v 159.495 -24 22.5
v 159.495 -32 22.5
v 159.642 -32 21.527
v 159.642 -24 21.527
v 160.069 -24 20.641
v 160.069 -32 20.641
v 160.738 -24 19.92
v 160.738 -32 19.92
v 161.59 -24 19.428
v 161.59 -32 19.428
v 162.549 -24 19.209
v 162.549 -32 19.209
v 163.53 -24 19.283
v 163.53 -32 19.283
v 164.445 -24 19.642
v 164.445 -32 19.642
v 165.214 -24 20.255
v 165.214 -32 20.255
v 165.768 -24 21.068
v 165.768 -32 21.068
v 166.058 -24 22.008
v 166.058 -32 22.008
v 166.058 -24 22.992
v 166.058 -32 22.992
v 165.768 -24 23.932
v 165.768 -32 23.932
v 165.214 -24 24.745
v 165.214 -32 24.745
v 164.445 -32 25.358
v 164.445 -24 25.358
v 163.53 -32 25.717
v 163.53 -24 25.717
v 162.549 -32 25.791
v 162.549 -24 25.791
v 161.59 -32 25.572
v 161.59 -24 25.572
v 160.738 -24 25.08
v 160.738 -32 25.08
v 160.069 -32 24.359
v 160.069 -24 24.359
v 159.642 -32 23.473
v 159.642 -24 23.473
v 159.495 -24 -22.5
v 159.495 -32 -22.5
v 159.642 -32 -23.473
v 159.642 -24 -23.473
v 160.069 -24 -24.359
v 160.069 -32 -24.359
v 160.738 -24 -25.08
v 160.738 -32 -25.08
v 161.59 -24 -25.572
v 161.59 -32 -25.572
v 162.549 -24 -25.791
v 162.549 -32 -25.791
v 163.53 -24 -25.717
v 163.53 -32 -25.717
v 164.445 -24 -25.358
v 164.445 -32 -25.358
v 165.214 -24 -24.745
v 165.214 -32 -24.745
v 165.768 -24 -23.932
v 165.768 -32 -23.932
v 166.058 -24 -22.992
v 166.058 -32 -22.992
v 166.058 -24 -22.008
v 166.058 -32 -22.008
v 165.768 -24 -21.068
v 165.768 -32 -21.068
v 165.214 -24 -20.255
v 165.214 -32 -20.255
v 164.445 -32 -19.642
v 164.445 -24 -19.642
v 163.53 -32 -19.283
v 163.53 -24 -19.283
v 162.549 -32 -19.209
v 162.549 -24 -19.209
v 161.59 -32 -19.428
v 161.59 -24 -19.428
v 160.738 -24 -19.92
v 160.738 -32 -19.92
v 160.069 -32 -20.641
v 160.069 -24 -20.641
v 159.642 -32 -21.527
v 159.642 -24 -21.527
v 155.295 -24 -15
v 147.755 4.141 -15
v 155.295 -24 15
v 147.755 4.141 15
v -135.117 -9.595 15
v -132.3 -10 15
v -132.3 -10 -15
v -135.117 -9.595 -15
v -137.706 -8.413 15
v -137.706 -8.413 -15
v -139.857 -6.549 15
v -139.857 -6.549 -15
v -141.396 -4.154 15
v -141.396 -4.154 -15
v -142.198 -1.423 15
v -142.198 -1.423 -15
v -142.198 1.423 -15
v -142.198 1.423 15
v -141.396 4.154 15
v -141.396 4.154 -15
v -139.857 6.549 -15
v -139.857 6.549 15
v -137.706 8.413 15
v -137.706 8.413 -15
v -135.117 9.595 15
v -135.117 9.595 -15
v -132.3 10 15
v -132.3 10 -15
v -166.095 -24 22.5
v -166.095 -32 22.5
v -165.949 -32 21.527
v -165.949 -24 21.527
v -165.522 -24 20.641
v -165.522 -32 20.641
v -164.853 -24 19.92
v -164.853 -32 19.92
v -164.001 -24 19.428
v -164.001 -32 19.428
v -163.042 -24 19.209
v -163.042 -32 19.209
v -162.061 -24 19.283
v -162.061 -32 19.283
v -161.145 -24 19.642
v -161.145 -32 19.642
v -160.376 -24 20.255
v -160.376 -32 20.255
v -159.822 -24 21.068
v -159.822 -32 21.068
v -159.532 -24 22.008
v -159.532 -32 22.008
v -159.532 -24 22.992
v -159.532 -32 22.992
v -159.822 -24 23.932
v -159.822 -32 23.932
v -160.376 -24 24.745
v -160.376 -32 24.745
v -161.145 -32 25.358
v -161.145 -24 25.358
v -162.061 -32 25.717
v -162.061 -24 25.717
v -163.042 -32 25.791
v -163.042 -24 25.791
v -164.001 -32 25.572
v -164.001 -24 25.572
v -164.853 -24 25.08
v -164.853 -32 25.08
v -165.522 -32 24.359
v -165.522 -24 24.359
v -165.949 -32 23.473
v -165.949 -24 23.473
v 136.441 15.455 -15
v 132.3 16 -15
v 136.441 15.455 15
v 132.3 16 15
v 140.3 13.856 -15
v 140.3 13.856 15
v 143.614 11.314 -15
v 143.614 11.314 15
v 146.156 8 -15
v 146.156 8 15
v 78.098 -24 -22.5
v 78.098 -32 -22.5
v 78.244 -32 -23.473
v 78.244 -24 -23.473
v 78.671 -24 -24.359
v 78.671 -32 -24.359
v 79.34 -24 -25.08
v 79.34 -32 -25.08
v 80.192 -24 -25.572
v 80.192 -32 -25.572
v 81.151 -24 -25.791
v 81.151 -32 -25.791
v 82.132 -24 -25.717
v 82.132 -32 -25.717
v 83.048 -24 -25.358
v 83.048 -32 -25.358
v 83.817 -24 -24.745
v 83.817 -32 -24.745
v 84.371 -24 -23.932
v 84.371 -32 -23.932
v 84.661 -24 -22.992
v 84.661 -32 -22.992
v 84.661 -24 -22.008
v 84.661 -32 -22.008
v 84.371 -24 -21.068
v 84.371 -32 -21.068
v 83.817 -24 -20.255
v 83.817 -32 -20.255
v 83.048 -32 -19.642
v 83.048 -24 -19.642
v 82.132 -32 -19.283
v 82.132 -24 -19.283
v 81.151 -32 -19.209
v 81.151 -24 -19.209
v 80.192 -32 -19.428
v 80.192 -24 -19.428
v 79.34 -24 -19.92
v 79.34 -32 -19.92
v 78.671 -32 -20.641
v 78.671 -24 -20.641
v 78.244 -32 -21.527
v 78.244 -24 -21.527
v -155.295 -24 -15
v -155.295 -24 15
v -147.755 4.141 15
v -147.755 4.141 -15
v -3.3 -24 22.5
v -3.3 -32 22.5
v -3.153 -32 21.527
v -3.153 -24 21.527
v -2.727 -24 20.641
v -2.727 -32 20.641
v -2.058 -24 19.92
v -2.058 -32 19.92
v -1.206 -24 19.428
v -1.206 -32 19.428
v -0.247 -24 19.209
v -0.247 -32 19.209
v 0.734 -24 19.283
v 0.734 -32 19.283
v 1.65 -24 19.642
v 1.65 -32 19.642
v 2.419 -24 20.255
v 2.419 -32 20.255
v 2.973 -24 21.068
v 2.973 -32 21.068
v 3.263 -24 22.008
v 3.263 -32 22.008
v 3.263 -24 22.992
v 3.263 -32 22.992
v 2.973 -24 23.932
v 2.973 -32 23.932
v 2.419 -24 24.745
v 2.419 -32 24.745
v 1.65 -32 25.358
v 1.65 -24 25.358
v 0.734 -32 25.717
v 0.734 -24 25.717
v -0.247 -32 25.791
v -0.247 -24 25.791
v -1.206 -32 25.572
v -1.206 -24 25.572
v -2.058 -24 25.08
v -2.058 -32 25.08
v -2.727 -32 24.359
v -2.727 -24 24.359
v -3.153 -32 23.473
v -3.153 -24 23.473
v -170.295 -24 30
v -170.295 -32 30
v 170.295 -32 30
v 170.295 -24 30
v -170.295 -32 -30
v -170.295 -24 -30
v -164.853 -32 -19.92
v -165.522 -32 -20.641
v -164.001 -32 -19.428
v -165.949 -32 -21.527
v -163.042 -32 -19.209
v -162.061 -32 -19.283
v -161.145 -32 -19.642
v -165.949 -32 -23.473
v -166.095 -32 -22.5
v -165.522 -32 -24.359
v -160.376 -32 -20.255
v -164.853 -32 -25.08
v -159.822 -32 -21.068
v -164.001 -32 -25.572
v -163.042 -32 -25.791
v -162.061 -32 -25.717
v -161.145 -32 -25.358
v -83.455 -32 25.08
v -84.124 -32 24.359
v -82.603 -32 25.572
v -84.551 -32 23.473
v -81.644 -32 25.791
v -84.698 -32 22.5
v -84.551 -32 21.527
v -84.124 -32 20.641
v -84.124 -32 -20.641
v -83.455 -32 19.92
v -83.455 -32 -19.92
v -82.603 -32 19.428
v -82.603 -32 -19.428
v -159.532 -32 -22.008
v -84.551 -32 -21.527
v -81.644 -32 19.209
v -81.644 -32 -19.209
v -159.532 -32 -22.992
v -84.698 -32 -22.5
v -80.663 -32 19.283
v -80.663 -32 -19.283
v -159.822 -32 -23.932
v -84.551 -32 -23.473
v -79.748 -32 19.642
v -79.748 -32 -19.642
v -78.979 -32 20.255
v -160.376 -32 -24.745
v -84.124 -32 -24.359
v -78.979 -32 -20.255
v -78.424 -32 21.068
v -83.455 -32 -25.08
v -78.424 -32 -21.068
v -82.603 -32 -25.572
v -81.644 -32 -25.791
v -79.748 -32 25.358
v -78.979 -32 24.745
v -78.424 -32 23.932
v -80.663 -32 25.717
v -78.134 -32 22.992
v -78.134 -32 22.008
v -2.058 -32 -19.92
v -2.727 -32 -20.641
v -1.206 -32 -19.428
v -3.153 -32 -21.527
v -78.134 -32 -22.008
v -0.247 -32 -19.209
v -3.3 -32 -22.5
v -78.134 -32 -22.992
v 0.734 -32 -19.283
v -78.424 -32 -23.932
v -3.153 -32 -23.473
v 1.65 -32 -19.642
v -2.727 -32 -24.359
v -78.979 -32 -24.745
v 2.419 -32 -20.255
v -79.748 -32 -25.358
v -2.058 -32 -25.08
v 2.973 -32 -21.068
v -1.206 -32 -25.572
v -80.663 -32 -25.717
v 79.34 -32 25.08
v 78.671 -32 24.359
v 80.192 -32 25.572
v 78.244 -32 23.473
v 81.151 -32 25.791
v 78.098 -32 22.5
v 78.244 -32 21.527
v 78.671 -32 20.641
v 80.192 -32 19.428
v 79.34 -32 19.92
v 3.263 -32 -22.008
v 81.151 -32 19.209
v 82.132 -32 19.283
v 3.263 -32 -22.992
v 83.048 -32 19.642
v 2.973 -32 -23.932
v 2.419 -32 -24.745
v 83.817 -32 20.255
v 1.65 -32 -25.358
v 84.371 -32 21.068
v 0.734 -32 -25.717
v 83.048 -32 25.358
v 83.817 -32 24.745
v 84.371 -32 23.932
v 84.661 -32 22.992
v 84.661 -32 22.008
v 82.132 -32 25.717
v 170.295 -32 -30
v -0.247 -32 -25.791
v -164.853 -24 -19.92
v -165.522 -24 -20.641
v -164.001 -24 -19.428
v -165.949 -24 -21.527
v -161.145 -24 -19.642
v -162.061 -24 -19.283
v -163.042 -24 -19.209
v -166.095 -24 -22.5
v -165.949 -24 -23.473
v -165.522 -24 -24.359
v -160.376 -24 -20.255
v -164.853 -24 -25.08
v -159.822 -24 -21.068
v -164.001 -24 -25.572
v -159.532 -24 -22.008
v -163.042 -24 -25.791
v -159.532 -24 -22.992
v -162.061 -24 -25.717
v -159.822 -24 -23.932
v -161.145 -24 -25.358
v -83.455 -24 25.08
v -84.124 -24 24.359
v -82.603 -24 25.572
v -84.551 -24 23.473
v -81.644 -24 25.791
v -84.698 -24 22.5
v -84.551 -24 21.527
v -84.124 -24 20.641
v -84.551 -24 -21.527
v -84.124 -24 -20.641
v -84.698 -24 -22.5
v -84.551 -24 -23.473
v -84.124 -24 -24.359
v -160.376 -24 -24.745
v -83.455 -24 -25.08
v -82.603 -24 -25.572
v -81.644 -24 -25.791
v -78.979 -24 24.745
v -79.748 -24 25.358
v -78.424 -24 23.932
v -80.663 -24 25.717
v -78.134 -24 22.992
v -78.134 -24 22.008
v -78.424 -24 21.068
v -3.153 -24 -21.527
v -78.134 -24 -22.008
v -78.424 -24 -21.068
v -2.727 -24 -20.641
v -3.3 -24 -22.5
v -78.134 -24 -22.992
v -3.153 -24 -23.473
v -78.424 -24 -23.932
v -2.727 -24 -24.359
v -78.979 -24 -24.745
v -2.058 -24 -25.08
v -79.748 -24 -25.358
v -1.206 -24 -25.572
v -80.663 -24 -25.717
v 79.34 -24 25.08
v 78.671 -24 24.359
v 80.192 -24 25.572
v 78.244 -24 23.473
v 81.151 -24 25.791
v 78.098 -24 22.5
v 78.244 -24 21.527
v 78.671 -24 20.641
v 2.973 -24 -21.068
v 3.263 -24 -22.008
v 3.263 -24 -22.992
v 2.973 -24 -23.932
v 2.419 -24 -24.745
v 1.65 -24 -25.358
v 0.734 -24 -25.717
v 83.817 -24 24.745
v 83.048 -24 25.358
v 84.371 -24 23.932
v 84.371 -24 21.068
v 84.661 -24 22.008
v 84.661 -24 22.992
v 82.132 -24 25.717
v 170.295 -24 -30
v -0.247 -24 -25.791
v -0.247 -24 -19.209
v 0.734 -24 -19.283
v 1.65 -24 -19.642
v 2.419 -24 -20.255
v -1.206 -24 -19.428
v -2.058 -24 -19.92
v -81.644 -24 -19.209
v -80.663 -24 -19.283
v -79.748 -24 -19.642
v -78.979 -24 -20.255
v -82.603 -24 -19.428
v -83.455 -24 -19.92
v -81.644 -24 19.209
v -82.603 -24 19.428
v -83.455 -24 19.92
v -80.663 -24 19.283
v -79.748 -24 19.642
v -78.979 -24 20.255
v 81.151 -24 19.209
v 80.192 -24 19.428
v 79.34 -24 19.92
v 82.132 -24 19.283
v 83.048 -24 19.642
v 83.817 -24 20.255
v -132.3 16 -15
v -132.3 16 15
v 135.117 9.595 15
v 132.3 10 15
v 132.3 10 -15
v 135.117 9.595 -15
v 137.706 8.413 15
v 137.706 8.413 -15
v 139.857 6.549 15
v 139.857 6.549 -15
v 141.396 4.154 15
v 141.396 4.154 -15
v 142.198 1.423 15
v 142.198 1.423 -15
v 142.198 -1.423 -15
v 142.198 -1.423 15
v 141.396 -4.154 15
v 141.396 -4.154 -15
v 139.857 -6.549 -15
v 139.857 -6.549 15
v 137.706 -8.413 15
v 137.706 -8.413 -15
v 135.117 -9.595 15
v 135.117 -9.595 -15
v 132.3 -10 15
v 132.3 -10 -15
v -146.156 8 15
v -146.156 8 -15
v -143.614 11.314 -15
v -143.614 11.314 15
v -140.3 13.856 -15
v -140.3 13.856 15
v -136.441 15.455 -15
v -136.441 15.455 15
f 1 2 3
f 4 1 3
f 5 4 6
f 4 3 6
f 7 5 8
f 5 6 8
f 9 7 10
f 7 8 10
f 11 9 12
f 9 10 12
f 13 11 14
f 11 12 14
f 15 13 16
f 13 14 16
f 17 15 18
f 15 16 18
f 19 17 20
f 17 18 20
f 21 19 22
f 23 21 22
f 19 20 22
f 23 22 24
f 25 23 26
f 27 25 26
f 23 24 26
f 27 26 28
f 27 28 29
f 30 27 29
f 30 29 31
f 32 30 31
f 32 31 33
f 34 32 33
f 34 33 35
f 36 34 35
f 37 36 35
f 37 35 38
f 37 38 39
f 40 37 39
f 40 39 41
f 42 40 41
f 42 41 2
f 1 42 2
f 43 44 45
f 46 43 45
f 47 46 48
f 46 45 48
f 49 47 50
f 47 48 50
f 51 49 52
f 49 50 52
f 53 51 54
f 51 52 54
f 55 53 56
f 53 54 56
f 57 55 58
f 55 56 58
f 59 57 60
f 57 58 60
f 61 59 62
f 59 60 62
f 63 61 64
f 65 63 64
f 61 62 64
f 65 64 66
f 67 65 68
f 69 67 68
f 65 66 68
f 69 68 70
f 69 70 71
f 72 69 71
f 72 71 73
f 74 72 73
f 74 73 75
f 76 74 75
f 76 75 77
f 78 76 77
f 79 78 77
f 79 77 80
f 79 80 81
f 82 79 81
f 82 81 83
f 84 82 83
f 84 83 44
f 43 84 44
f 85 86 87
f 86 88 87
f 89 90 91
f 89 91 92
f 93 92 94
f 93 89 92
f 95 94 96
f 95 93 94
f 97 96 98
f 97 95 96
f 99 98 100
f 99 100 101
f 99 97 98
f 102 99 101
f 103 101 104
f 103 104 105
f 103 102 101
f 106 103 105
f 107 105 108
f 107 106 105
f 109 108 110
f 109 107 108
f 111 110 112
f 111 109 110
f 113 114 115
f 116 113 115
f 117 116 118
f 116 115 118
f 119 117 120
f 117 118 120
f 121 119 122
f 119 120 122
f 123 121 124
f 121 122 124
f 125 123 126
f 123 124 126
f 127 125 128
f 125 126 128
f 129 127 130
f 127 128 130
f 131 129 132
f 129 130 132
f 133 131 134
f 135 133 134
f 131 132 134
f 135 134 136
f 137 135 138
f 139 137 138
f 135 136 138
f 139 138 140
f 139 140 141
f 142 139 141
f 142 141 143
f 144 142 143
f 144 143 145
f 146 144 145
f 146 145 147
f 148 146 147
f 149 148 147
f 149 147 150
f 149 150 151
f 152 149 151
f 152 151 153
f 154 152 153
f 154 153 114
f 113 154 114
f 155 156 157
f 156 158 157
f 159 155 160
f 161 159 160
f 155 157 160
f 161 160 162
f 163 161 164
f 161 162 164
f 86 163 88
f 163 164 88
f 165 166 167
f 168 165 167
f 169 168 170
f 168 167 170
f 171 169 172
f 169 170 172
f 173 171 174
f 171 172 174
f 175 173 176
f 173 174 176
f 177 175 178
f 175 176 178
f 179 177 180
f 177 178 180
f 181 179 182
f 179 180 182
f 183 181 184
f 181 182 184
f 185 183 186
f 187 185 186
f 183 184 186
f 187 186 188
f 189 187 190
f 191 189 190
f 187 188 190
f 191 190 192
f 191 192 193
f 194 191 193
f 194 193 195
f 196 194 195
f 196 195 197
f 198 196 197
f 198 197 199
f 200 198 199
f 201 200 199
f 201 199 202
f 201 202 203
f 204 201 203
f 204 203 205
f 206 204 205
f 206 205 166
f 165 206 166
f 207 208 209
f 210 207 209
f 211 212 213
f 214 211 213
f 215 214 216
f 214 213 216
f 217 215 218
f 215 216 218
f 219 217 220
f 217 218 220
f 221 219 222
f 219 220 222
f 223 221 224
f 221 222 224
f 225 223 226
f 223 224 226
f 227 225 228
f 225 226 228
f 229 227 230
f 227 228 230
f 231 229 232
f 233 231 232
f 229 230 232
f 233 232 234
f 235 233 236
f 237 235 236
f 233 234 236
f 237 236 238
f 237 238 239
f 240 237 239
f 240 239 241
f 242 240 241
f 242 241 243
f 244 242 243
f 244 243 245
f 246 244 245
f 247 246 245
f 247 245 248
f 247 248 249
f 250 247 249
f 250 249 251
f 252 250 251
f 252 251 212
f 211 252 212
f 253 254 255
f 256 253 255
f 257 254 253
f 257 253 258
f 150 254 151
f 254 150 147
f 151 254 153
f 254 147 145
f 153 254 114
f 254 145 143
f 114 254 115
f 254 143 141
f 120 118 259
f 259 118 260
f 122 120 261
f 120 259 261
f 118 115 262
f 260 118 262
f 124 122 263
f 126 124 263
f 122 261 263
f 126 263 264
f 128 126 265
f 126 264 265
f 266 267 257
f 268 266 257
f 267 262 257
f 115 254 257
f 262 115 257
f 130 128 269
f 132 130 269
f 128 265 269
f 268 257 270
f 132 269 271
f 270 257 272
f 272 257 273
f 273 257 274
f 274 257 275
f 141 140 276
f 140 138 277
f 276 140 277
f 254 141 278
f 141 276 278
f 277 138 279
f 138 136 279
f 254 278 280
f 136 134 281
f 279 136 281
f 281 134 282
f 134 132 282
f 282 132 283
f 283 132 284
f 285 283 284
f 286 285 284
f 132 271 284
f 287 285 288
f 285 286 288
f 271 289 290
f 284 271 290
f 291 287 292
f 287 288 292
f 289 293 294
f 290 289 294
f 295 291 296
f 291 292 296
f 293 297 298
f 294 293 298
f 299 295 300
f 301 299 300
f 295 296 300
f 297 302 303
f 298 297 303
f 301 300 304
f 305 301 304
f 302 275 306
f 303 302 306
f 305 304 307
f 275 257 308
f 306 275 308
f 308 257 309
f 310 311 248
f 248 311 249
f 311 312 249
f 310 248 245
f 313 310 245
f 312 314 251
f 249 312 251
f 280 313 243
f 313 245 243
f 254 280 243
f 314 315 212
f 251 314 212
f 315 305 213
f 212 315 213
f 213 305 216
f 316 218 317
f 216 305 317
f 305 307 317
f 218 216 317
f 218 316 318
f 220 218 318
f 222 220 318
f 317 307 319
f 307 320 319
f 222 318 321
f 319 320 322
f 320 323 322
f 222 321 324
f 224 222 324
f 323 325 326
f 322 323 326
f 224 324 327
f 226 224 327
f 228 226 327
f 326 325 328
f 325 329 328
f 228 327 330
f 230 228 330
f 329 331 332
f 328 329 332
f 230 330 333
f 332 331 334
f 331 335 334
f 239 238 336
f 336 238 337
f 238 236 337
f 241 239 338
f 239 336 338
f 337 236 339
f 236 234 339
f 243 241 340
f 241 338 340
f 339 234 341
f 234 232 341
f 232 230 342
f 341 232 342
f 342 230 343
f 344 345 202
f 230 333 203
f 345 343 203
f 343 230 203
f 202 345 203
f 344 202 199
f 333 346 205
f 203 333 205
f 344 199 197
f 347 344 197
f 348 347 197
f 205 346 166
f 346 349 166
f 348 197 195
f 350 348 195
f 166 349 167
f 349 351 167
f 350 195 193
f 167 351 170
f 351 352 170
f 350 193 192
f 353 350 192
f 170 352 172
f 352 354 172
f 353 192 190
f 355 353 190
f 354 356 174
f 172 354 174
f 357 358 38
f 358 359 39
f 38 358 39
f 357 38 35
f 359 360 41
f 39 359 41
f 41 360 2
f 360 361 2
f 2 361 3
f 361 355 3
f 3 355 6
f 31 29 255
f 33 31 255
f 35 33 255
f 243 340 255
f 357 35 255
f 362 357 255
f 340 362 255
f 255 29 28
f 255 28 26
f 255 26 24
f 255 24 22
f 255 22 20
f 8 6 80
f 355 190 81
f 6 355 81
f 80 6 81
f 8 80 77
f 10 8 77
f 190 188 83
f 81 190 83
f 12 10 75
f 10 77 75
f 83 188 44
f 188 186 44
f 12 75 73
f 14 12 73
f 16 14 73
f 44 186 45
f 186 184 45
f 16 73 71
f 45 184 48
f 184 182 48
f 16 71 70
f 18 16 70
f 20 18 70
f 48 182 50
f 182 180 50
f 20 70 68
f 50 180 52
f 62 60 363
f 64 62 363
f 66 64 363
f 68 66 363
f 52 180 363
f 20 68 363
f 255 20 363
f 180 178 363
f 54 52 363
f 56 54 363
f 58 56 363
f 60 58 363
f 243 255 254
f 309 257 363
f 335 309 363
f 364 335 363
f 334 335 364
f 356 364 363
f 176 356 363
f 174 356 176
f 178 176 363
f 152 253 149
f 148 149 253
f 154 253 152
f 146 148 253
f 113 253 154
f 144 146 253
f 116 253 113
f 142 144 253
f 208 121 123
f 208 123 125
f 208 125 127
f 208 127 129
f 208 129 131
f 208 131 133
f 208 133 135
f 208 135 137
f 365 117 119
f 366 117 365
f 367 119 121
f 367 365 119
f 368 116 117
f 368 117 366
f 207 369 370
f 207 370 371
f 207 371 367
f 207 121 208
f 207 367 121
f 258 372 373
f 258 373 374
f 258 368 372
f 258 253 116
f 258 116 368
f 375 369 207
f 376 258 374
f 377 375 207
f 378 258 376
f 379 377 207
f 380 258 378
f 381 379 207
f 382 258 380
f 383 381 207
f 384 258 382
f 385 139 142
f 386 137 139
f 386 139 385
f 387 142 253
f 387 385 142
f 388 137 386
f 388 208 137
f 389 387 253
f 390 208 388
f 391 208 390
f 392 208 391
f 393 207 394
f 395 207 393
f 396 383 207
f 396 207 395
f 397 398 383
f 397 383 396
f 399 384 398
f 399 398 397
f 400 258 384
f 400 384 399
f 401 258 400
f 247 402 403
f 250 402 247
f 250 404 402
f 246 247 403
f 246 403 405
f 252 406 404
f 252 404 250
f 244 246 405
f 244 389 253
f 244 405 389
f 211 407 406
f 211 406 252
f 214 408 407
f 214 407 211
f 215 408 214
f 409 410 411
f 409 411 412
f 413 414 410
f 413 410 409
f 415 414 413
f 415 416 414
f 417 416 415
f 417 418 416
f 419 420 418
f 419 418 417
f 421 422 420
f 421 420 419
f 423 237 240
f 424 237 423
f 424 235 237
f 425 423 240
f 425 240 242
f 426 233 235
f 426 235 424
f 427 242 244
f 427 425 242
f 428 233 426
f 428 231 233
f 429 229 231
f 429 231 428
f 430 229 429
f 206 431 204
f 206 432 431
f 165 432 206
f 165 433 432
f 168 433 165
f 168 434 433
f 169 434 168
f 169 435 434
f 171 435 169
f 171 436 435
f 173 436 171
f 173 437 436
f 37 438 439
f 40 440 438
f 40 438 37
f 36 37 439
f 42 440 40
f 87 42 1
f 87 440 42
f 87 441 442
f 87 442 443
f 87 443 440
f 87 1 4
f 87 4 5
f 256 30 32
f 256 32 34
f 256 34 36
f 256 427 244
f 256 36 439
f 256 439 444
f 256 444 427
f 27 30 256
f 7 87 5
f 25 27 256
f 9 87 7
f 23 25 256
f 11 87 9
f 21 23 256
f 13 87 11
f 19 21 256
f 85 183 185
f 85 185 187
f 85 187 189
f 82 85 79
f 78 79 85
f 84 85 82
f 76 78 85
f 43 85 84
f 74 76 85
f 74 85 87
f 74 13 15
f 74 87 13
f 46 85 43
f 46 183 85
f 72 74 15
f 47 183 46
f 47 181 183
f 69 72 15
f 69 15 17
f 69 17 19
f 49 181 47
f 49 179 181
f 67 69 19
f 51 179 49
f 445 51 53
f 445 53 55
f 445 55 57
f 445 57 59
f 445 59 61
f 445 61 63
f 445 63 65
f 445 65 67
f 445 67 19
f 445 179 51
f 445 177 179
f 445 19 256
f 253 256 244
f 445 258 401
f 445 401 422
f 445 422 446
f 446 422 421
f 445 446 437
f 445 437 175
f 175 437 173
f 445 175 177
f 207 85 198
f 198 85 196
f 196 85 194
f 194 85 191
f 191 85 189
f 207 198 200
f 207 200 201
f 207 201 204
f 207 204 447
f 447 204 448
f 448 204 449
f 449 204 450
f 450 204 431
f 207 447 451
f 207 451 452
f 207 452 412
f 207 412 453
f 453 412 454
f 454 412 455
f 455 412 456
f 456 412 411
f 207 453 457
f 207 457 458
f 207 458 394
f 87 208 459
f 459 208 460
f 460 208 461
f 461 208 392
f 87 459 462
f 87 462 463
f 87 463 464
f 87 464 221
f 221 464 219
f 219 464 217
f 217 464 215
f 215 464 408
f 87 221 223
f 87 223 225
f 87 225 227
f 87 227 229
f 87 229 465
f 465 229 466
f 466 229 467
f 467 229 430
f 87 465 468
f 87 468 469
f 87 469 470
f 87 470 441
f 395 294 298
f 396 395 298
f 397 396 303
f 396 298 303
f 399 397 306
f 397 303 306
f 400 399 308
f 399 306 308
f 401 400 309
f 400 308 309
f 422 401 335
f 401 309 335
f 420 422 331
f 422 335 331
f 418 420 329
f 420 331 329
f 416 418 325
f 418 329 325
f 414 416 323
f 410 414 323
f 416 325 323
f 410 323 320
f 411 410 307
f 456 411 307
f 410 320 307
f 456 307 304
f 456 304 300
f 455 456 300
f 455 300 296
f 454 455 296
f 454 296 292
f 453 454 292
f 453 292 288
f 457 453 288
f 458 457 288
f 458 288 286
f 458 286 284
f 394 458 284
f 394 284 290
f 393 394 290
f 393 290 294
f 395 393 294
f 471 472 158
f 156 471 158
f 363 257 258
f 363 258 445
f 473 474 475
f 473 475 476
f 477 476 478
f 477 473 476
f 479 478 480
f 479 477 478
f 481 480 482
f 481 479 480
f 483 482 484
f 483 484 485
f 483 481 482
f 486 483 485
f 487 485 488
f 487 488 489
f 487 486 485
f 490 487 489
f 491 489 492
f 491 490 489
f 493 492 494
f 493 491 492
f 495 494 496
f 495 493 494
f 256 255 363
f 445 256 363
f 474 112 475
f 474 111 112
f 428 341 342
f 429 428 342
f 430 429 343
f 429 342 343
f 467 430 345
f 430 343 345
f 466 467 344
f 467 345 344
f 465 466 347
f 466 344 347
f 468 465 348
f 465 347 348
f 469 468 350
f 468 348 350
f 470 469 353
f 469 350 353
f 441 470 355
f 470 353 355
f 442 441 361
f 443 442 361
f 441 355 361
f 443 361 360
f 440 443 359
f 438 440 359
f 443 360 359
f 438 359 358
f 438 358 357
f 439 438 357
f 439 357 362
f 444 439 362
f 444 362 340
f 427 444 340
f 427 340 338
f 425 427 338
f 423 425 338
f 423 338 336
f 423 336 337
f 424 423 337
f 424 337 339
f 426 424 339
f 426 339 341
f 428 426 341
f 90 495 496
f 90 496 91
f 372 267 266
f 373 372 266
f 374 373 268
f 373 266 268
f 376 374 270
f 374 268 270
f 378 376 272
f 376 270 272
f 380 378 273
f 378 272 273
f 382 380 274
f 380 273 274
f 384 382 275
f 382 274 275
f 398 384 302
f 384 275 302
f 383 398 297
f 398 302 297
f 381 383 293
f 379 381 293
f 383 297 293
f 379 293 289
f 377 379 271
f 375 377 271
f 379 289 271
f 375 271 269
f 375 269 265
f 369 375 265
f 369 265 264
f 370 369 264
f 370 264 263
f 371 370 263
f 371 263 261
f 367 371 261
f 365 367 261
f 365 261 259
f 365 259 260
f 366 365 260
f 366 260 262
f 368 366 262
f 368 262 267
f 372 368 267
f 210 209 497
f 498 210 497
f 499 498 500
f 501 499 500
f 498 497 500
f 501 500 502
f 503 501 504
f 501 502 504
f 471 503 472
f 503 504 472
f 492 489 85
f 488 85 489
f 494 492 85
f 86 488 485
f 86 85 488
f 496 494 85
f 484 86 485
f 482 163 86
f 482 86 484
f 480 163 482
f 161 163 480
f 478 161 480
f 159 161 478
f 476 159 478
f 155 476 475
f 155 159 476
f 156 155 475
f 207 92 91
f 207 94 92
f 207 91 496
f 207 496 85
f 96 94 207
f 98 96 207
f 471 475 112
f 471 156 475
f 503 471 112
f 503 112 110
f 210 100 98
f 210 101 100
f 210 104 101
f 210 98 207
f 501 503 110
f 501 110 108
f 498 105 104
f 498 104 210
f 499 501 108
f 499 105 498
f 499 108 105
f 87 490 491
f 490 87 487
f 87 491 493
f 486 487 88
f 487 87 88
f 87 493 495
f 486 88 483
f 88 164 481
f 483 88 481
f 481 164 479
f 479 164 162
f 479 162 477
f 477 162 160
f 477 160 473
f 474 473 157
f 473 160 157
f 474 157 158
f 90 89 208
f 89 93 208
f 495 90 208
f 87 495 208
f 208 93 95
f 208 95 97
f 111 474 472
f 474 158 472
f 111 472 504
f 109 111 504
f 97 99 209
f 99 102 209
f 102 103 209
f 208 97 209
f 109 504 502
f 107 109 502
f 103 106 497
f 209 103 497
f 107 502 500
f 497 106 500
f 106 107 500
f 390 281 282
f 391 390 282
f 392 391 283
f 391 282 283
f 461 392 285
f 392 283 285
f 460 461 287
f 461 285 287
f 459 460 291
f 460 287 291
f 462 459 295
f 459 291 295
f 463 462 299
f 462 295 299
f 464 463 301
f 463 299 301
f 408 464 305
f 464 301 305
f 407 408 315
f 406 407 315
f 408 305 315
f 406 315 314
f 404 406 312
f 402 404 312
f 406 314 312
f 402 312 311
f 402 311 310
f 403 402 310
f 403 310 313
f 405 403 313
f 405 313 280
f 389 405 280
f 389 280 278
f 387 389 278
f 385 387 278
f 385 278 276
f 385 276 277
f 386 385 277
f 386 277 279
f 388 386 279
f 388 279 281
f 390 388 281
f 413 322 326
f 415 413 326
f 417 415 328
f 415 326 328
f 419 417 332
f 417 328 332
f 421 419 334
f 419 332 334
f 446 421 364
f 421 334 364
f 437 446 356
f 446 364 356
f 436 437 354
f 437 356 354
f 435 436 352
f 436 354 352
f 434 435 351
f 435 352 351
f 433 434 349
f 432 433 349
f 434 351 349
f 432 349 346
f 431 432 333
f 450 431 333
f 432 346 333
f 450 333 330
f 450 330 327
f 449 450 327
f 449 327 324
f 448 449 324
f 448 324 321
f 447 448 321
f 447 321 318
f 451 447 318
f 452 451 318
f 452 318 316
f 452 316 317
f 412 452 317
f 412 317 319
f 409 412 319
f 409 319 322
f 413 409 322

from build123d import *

# Parameters (mm, degrees)
BOSS_EXTRUDE1_DEPTH  = 15
SKETCH3_W            = 340.59039901
SKETCH3_H            = 15
BOSS_EXTRUDE2_DEPTH  = 8
M6_CLEARANCE_HOLE1_D = 6.6


with BuildPart() as part:
    # Sketch1 → Boss-Extrude1 (new, symmetric)
    with BuildSketch(Plane.XY):
        with BuildLine():
            Line((-132.3, 16), (132.3, 16))
            ThreePointArc((132.3, 16), (142.040182864, 12.693653445), (147.754813221, 4.141104722))
            Line((147.754813221, 4.141104722), (155.295199505, -24))
            Line((155.295199505, -24), (170.295199505, -24))
            Line((170.295199505, -24), (170.295199505, -32))
            Line((170.295199505, -32), (-170.295199505, -32))
            Line((-170.295199505, -32), (-170.295199505, -24))
            Line((-170.295199505, -24), (-155.295199505, -24))
            Line((-155.295199505, -24), (-147.754813221, 4.141104722))
            ThreePointArc((-147.754813221, 4.141104722), (-142.040182864, 12.693653445), (-132.3, 16))
        make_face()
        with BuildLine():
            Line((-132.3, 10), (132.3, 10))
            ThreePointArc((132.3, 10), (142.3, 0), (132.3, -10))
            Line((132.3, -10), (-132.3, -10))
            ThreePointArc((-132.3, -10), (-142.3, 0), (-132.3, 10))
        make_face(mode=Mode.SUBTRACT)
    extrude(amount=BOSS_EXTRUDE1_DEPTH, both=True)

    # Sketch3 → Boss-Extrude2 (add)
    with BuildSketch(Plane.XZ.offset(32)):
        with Locations((0, 22.5)):
            Rectangle(SKETCH3_W, SKETCH3_H)
    boss_extrude2 = extrude(amount=-BOSS_EXTRUDE2_DEPTH)

    # Mirror1: Boss-Extrude2 across plane
    add(boss_extrude2.mirror(Plane.XY))

    # M6 Clearance Hole1 (through all)
    with Locations(Plane(origin=(-162.795199505, -24, -22.5), x_dir=(1, 0, 0), z_dir=(0, 1, 0))):
        with Locations((0, 0), (0, -45), (81.397599753, -45), (81.397599753, 0), (162.795199505, -45), (162.795199505, 0), (244.192799257, -45), (244.192799257, 0), (325.59039901, 0), (325.59039901, -45)):
            Hole(M6_CLEARANCE_HOLE1_D / 2)


solid = part.part
